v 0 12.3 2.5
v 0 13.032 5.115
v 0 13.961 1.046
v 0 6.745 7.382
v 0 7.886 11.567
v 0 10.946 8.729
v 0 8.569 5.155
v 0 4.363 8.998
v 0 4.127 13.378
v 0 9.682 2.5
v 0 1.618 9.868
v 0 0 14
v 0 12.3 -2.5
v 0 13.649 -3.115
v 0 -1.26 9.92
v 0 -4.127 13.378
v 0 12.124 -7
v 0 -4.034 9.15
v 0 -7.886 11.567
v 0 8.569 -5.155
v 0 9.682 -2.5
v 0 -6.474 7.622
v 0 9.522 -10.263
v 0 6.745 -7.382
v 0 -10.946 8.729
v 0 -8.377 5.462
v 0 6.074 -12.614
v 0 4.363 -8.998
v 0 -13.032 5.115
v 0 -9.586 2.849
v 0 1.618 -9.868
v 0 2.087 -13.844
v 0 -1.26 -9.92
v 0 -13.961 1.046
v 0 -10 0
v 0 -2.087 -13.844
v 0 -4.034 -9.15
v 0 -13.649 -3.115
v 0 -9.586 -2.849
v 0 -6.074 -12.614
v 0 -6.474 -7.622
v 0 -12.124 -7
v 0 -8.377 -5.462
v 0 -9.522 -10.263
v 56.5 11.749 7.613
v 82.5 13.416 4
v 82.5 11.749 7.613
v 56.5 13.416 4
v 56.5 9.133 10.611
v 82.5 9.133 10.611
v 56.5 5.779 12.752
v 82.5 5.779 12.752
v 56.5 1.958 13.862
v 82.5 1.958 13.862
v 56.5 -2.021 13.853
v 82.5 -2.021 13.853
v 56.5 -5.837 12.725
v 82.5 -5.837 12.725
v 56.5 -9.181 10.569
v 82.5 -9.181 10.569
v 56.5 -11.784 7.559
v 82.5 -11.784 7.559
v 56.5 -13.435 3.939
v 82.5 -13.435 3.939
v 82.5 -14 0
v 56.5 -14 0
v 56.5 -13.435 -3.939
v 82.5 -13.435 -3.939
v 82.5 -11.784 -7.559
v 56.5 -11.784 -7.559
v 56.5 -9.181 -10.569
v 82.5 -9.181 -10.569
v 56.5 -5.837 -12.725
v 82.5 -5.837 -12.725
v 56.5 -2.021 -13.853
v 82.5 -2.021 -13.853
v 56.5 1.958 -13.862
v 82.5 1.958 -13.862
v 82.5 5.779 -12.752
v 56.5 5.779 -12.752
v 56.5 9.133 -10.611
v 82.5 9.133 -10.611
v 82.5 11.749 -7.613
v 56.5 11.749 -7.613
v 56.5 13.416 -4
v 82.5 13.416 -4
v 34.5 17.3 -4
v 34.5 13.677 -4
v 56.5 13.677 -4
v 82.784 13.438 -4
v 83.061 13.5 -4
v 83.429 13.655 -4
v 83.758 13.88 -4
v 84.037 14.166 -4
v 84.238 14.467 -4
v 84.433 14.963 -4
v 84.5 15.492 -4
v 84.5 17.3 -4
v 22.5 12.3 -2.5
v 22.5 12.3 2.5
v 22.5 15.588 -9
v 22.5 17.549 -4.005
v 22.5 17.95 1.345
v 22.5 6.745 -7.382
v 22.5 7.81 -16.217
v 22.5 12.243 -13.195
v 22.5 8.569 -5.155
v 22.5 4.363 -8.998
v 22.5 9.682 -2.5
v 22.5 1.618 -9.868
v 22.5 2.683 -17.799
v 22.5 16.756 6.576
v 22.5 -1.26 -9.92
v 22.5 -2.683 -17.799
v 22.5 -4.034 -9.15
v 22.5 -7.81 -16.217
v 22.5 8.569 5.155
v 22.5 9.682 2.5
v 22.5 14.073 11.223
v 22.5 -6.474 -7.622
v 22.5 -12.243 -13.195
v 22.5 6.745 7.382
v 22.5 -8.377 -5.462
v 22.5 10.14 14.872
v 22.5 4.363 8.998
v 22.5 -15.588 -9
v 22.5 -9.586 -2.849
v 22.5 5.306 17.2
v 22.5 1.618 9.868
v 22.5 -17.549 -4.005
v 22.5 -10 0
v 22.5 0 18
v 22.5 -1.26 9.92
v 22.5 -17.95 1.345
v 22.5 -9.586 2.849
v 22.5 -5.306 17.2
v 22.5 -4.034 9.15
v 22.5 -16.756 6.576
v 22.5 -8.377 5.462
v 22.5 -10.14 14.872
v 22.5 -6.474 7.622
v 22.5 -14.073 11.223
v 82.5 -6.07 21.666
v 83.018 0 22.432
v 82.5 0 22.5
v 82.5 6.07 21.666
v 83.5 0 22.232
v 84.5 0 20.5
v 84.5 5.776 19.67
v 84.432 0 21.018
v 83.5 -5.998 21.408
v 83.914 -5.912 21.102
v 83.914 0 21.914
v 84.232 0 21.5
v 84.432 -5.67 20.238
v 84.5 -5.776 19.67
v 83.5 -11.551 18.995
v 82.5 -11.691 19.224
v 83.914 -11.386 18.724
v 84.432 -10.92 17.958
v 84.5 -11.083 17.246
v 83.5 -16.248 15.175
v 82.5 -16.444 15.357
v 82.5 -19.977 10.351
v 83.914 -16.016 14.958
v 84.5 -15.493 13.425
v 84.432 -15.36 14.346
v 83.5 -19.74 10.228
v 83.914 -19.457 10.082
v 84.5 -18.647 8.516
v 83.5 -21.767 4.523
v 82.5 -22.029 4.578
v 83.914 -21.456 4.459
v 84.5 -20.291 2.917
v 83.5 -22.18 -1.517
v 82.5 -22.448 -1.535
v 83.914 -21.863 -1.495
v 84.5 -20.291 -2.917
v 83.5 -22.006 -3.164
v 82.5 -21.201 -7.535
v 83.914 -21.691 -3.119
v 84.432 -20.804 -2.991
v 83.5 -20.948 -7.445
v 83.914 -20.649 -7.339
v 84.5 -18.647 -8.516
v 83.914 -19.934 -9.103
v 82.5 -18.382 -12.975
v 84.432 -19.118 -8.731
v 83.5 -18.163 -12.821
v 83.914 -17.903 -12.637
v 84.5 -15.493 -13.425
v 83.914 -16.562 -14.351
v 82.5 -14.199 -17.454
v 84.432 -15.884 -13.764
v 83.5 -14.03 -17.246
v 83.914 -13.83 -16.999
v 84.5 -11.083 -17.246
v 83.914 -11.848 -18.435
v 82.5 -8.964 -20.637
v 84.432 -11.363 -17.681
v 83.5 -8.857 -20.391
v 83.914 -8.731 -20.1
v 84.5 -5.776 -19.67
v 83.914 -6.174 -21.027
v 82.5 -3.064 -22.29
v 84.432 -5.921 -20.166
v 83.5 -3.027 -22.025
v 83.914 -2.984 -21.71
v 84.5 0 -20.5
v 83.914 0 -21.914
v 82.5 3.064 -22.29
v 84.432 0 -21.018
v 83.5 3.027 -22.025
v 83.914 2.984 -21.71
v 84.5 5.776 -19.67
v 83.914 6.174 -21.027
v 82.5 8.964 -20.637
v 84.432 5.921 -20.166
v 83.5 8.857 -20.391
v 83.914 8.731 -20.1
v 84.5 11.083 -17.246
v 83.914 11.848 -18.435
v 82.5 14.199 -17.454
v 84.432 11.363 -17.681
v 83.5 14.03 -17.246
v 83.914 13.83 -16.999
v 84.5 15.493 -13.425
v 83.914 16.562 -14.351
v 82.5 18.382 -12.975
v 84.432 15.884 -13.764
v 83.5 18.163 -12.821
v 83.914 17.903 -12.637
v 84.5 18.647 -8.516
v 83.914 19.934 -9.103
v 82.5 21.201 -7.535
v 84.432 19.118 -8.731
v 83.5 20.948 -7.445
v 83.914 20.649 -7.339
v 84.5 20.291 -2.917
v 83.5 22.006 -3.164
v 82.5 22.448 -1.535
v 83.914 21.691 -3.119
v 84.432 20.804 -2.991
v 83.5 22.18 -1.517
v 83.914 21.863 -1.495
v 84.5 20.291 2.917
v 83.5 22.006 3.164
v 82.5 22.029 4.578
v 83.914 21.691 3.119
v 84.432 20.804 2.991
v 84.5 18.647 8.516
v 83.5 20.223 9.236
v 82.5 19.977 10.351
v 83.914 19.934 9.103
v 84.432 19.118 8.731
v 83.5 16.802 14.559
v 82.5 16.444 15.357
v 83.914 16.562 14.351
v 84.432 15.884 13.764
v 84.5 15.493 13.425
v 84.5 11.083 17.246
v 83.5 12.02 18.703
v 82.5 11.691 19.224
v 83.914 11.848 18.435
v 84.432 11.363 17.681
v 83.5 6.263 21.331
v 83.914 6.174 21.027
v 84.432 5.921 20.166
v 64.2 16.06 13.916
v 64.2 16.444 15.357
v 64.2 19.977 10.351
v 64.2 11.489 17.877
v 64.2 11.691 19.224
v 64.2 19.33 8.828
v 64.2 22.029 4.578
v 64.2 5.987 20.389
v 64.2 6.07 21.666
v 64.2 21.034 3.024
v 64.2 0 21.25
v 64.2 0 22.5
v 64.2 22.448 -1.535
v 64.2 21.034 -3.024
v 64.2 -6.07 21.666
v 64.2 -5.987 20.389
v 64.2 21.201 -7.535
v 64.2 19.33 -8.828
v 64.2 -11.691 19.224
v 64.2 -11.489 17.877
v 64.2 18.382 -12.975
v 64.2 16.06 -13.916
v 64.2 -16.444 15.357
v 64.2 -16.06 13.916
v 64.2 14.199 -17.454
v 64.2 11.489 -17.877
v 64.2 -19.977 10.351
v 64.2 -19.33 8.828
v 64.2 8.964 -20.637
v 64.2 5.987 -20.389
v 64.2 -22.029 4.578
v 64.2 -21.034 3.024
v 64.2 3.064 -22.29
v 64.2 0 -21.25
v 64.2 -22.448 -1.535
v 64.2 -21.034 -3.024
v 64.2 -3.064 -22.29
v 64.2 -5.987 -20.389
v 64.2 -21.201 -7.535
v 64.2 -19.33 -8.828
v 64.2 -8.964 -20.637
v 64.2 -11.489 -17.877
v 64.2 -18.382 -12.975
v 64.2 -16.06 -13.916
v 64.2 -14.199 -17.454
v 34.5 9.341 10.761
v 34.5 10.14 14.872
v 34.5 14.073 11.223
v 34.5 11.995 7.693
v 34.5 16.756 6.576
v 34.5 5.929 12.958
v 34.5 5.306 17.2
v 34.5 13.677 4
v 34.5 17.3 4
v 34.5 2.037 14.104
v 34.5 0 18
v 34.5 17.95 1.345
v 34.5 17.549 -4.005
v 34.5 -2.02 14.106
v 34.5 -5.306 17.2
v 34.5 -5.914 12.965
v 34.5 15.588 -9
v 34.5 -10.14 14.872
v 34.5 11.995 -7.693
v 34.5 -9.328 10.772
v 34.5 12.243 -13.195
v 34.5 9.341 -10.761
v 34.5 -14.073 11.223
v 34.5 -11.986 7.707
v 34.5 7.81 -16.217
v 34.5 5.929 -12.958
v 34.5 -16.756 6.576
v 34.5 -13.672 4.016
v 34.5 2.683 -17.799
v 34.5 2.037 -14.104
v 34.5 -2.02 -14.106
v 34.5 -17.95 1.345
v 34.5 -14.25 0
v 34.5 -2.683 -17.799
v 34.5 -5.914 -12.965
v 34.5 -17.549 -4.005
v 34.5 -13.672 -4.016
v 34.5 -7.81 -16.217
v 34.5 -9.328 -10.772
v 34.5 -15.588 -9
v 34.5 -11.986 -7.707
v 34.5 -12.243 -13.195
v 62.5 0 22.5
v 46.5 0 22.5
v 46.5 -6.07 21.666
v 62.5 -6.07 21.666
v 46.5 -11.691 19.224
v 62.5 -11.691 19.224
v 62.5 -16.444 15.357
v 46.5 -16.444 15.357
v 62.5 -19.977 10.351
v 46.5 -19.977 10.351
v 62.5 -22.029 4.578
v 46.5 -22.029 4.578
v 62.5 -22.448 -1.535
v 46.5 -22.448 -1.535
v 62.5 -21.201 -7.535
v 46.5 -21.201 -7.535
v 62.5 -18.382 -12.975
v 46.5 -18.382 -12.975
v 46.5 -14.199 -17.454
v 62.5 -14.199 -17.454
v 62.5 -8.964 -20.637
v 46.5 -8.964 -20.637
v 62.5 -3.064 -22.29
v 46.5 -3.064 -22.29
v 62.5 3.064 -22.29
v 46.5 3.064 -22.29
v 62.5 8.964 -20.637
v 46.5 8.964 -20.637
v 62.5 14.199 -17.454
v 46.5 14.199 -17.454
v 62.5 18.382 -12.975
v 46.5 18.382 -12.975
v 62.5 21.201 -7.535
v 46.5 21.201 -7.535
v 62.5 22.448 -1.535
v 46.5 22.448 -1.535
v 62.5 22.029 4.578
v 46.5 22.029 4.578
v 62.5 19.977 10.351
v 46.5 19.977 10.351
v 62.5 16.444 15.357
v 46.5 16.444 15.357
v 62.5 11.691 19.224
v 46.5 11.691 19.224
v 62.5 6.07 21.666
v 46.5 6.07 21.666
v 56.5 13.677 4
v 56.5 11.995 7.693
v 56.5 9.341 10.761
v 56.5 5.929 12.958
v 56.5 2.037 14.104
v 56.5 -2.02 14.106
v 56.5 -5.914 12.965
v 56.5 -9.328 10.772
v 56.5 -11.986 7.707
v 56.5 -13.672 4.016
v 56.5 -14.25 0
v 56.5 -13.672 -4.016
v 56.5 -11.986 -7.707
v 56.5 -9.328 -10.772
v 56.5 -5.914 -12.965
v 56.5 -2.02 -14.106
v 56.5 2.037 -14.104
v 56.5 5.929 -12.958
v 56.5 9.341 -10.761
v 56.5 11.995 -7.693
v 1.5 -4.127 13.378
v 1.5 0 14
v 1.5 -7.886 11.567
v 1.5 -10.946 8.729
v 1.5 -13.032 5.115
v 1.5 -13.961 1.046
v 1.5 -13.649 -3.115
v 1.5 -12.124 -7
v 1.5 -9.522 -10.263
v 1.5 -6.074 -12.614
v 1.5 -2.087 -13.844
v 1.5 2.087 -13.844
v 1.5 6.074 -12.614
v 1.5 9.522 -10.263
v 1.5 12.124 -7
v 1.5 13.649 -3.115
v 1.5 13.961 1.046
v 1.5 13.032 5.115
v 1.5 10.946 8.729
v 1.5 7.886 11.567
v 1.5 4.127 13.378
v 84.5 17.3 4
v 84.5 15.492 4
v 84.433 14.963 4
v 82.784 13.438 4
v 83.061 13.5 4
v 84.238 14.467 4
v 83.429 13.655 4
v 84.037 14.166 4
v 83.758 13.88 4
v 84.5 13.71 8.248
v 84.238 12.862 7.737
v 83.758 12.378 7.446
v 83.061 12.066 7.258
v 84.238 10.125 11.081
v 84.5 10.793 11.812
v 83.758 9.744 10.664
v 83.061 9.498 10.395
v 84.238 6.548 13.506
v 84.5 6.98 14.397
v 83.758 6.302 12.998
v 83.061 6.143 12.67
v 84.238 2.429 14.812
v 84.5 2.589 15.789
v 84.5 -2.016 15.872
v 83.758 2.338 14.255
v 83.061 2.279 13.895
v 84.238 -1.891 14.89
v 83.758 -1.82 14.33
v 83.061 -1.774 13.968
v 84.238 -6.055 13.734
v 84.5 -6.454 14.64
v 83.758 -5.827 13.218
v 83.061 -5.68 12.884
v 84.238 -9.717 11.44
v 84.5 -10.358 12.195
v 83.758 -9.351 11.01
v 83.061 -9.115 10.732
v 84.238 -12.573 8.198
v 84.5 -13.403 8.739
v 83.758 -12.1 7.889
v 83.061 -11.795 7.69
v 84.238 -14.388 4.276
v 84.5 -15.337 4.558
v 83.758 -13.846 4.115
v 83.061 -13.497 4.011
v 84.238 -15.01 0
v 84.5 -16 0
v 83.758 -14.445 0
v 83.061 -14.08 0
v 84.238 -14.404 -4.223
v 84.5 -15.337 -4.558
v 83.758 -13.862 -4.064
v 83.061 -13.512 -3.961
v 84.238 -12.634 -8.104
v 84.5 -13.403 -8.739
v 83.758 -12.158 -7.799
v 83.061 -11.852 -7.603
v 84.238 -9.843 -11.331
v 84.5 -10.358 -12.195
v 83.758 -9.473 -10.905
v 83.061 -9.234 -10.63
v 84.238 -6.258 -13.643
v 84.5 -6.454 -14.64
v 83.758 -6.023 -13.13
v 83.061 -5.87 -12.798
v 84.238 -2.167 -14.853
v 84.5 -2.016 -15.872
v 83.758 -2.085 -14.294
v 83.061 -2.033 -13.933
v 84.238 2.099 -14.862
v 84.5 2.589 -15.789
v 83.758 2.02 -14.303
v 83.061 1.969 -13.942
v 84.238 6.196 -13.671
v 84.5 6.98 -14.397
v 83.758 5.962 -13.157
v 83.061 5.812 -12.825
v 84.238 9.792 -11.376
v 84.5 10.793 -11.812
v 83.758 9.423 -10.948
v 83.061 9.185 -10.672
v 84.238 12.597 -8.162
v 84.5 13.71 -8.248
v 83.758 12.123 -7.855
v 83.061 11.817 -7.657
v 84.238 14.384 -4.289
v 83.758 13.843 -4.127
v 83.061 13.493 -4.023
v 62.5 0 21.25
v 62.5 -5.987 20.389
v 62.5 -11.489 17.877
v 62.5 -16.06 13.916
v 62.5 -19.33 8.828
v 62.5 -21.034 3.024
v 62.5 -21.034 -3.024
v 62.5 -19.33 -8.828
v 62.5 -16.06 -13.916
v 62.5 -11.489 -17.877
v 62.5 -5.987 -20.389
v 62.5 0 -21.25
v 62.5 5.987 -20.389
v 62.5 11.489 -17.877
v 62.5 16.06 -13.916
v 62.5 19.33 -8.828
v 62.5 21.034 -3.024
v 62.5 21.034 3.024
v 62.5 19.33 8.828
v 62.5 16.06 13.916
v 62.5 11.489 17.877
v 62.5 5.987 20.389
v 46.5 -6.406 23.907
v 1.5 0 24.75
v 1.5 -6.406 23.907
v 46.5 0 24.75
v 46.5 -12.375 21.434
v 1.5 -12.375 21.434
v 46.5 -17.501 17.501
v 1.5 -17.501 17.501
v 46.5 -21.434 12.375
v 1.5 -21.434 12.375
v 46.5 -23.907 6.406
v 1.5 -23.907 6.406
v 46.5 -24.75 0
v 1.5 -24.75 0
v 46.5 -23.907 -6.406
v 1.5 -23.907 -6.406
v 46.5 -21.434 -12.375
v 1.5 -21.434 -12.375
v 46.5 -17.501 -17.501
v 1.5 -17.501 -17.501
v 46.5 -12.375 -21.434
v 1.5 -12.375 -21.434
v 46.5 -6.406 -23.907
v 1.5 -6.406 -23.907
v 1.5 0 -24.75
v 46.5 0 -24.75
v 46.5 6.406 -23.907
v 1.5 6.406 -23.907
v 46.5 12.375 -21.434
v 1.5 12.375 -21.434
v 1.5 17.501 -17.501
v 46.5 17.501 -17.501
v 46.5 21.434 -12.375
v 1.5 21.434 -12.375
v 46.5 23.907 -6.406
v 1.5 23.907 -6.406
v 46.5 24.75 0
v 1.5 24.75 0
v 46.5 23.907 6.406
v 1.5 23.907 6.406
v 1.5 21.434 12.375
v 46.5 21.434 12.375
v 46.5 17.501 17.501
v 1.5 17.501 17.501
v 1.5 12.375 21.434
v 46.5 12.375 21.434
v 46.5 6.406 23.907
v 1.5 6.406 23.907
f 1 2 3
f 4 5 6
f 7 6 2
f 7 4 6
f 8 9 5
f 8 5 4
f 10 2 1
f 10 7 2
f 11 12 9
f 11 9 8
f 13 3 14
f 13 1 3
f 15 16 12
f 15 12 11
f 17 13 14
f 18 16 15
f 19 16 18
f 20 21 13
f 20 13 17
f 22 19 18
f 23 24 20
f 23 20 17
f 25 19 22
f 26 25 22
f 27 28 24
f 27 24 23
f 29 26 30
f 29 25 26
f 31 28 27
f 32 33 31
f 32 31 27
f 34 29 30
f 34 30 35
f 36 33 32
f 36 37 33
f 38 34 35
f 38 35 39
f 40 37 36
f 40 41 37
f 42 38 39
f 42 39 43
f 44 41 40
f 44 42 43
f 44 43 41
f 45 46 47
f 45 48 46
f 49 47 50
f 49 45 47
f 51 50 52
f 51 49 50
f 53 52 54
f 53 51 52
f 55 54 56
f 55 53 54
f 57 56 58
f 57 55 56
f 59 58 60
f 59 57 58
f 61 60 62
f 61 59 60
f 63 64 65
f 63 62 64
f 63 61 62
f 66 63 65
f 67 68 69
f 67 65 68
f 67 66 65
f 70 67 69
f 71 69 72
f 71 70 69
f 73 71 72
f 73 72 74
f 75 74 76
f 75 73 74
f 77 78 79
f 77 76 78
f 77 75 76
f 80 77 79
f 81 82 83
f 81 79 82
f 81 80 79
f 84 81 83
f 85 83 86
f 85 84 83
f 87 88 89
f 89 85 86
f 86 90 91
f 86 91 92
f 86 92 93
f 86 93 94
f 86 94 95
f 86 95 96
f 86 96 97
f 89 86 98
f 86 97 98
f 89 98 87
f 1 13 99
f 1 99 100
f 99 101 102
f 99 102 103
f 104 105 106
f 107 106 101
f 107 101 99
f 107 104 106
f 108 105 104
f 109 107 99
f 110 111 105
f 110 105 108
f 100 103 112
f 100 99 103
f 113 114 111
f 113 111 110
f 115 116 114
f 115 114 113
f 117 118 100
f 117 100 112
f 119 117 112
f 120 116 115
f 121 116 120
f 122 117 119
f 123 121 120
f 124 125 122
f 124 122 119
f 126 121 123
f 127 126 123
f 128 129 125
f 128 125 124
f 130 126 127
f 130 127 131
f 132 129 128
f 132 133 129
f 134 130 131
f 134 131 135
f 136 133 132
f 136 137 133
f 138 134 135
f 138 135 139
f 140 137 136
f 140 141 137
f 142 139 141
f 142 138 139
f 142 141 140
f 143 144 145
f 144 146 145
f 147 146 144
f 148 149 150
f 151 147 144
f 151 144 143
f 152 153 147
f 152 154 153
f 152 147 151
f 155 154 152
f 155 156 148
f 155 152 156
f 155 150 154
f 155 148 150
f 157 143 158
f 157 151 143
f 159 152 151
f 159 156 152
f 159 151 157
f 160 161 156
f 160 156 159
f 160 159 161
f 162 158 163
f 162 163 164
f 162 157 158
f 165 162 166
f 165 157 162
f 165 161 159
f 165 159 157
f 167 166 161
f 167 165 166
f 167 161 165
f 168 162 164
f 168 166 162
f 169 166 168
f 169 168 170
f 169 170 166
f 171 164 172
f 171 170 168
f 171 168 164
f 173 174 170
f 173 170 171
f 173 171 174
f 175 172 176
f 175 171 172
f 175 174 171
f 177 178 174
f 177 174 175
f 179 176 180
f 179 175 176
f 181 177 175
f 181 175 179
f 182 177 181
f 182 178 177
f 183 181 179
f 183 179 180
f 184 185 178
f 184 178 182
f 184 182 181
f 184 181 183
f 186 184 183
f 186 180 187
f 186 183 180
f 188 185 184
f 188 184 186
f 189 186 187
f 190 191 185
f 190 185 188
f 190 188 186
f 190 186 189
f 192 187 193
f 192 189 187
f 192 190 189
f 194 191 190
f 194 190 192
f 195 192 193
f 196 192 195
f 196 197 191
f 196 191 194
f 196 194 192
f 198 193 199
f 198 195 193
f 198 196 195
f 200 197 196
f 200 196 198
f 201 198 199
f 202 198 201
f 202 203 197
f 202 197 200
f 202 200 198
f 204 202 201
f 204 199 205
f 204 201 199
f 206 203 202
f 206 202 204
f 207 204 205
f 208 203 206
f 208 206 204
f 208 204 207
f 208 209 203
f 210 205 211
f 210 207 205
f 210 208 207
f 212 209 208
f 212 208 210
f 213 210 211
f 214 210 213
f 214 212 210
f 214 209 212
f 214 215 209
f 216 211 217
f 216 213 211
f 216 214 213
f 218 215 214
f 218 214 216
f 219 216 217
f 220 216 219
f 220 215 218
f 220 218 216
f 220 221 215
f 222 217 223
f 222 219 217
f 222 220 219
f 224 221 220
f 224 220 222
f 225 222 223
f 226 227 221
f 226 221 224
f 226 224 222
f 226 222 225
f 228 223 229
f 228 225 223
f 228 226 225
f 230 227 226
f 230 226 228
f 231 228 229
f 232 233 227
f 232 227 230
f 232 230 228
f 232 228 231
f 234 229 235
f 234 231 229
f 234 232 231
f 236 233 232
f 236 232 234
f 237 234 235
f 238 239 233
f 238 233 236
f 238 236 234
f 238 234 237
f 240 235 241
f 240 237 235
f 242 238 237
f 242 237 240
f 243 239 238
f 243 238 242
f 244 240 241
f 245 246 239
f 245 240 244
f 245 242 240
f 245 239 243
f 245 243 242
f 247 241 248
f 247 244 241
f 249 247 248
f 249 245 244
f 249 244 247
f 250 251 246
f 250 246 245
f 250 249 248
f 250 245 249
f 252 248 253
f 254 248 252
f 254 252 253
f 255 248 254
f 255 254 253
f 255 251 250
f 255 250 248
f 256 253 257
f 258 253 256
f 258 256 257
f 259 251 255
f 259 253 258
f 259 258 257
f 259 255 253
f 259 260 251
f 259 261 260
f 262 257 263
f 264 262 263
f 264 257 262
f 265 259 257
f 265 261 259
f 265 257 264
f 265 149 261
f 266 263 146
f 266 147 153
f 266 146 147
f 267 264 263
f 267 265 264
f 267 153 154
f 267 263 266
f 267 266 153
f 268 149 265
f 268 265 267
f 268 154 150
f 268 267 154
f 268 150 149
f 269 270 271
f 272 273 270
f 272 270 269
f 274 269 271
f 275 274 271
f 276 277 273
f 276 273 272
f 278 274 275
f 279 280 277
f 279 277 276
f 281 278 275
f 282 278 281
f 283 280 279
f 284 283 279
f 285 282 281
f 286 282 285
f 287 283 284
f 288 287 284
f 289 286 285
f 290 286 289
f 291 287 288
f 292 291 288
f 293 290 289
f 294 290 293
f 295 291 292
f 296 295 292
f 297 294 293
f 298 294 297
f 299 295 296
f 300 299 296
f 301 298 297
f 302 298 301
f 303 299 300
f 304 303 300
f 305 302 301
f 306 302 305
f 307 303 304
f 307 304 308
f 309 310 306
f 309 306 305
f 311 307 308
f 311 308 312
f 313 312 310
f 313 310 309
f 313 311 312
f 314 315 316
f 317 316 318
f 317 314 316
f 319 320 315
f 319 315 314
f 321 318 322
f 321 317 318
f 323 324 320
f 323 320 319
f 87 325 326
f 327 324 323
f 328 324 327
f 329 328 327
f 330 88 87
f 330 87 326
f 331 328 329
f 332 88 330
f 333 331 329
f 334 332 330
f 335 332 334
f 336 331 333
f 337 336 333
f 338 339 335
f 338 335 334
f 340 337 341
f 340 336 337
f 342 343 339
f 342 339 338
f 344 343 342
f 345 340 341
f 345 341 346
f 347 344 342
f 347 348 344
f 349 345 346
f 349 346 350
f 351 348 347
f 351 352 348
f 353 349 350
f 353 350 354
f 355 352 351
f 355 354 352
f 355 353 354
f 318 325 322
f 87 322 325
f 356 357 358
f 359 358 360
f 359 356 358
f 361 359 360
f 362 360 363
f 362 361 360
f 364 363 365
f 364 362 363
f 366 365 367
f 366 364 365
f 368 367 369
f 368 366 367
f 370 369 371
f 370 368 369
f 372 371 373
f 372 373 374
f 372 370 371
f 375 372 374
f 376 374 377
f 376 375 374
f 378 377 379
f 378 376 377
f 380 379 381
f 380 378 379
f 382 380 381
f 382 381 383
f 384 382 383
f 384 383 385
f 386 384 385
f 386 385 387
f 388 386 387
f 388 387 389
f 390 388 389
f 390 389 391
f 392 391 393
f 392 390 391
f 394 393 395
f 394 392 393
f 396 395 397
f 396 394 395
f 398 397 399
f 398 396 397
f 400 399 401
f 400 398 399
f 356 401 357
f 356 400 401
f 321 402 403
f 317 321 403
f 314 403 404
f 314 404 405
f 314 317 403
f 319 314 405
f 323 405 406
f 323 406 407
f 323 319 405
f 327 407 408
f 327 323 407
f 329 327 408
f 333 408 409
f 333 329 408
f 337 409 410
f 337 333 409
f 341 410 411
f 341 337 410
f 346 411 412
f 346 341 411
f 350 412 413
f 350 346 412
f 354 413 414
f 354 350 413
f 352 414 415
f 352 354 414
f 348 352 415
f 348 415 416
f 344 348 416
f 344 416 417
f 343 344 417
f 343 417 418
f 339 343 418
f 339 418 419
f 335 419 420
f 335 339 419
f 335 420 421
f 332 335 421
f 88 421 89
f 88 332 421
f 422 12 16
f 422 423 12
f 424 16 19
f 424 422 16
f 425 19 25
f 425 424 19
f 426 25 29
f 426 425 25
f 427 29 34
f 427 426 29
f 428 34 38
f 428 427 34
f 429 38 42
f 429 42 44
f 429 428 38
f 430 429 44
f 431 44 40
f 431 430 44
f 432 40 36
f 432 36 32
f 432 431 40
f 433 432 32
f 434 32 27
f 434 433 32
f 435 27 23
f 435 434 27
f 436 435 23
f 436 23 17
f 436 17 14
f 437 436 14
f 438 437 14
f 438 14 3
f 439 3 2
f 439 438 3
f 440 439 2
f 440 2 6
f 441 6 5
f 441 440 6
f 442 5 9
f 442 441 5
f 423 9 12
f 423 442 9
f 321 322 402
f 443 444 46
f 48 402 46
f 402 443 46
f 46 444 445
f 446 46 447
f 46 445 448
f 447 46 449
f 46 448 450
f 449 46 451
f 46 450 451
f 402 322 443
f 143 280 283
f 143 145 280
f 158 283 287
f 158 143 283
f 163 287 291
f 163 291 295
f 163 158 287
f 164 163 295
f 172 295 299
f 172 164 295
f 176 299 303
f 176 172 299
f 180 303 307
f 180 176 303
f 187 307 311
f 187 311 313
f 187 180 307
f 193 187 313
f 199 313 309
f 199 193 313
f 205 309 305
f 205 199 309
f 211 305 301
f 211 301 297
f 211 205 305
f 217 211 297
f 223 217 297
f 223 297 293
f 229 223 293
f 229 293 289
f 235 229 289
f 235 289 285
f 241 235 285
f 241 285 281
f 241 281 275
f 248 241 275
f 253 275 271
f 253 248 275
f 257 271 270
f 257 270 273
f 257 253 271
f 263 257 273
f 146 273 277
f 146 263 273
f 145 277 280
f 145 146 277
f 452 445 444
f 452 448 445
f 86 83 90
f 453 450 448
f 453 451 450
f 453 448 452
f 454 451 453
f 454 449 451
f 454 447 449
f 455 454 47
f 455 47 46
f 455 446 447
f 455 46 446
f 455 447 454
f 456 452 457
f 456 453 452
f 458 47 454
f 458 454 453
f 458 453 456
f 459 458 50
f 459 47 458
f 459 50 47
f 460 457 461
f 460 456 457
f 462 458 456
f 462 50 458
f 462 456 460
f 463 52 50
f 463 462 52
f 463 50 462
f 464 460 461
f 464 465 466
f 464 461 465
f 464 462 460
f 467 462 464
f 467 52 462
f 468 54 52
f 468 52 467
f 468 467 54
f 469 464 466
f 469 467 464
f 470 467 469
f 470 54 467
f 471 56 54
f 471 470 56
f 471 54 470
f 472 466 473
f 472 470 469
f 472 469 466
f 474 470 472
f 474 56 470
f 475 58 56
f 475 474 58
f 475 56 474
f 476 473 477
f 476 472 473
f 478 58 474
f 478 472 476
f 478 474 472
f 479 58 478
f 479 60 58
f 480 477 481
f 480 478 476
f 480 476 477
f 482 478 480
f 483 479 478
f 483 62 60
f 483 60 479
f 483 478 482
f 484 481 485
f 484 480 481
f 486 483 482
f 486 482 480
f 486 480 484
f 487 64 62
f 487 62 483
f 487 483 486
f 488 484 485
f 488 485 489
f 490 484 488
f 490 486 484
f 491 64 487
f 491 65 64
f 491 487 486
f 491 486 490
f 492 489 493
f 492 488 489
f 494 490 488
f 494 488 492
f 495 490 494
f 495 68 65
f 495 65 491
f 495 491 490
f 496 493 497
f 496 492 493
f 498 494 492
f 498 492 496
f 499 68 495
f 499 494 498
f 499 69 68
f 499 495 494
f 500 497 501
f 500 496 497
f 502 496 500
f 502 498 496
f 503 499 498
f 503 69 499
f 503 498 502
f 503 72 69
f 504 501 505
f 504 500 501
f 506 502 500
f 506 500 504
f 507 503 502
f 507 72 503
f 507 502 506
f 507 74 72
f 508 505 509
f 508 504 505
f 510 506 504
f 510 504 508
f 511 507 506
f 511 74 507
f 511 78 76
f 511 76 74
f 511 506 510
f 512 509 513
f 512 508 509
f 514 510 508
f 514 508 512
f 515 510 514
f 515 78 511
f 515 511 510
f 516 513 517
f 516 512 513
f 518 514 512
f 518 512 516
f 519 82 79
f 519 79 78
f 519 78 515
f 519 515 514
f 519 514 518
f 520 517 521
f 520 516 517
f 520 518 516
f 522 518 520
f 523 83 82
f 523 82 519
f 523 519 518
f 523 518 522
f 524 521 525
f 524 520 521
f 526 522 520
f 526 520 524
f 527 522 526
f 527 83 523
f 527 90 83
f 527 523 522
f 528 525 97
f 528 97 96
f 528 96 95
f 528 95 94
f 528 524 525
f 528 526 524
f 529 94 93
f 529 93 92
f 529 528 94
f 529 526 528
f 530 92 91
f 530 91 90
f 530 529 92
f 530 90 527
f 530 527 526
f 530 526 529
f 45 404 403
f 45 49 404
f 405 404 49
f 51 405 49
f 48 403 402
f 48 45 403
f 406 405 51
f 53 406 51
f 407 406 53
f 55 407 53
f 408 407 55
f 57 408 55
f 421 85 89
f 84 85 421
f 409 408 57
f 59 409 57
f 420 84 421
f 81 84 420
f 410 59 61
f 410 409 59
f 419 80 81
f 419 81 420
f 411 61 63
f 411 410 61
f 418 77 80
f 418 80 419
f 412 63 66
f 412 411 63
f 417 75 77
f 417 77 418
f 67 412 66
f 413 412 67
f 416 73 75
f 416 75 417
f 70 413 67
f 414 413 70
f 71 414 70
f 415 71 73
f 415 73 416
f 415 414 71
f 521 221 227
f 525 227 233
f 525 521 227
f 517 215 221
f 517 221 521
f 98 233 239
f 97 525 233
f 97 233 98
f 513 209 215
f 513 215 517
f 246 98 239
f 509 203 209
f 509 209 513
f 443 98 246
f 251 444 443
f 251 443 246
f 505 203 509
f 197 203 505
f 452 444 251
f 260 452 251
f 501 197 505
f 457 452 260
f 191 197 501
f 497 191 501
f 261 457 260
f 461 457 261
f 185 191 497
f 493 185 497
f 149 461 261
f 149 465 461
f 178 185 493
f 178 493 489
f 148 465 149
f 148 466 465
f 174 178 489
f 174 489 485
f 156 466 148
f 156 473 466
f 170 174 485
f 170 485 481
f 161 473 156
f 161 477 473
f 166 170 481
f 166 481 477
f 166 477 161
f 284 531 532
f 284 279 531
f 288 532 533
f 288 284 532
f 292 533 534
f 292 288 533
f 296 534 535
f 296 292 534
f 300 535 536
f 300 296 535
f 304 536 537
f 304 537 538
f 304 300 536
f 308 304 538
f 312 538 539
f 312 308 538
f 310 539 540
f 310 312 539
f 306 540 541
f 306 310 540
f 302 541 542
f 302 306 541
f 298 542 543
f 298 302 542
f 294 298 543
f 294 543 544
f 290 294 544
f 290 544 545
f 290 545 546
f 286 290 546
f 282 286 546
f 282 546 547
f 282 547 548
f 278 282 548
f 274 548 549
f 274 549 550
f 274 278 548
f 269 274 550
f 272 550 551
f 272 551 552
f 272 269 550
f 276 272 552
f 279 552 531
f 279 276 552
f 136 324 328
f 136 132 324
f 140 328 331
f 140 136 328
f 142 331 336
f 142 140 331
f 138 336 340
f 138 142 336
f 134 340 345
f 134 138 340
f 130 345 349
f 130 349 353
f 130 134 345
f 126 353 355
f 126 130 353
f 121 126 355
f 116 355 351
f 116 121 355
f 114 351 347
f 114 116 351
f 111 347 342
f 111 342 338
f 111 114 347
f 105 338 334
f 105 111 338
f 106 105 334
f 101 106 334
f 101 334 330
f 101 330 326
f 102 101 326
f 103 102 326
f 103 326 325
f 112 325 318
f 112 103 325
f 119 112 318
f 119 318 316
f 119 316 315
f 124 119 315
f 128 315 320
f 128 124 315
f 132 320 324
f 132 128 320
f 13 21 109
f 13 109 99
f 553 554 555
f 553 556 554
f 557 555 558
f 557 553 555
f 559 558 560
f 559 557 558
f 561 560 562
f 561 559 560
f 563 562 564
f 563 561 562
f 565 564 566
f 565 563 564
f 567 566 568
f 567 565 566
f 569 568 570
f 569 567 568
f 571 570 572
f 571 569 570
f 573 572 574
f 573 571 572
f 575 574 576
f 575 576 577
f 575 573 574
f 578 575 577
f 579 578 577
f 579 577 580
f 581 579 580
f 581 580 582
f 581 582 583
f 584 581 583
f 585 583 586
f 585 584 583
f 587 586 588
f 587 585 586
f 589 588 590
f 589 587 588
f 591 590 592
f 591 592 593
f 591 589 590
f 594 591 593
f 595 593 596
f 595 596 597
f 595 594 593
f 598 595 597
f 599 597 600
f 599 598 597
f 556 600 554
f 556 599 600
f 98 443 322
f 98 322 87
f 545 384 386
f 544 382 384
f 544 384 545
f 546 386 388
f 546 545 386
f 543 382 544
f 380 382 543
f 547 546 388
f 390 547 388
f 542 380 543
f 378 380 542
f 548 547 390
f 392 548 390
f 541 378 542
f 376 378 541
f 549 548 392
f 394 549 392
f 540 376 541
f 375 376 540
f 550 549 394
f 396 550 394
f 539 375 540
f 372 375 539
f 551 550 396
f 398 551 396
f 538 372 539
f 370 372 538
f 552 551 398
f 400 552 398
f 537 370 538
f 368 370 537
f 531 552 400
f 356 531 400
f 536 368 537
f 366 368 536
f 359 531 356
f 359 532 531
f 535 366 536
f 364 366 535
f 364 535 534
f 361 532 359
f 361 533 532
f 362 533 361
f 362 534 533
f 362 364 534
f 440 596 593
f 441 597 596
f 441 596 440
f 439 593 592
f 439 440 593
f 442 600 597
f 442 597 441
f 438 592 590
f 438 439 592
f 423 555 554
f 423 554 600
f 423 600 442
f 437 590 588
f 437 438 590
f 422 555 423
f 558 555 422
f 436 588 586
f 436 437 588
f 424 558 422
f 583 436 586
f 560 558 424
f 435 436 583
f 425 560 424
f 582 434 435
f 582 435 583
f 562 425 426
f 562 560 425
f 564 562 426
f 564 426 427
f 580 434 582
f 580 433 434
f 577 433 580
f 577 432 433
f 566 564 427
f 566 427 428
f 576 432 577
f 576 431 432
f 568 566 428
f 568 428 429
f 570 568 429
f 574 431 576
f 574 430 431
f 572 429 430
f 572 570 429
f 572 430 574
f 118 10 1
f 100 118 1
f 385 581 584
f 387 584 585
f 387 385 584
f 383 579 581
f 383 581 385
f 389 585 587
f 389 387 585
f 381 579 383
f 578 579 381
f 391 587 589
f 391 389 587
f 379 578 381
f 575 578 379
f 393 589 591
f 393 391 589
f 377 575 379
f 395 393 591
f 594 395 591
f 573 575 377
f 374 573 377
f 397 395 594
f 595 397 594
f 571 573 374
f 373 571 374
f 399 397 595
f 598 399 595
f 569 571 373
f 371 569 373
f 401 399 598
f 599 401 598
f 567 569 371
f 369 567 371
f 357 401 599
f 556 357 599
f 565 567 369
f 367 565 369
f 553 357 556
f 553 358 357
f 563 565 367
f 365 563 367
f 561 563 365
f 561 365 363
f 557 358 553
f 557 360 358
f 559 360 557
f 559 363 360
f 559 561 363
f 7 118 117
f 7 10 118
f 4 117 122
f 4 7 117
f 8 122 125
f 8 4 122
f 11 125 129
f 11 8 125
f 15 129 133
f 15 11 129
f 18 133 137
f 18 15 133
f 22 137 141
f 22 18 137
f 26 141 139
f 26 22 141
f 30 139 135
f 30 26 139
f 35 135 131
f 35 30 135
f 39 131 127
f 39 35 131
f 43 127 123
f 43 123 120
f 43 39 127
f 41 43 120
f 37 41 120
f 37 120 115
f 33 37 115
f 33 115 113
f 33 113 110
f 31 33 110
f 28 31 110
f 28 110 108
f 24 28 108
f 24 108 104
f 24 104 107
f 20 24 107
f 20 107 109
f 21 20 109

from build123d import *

# Parameters (mm, degrees)
CUT_EXTRUDE_1_REACH = 93.462
SKETCH_2_W          = 5
SKETCH_2_H          = 4.6
CUT_EXTRUDE_2_REACH = 93.462


with BuildPart() as part:
    # 草图1 → 旋转1 (revolve)
    with BuildSketch(Plane(origin=(0, 0, 0), x_dir=(1, 0, 0), z_dir=(0, 1, 0)), mode=Mode.PRIVATE) as revolve_1_sk:
        with BuildLine():
            Line((0, 10), (0, 14))
            Line((0, 14), (1.5, 14))
            Line((1.5, 14), (1.5, 24.75))
            Line((1.5, 24.75), (46.5, 24.75))
            Line((46.5, 24.75), (46.5, 22.5))
            Line((46.5, 22.5), (62.5, 22.5))
            Line((62.5, 22.5), (62.5, 21.25))
            Line((62.5, 21.25), (64.2, 21.25))
            Line((64.2, 21.25), (64.2, 22.5))
            Line((64.2, 22.5), (82.5, 22.5))
            ThreePointArc((82.5, 22.5), (83.914213562, 21.914213562), (84.5, 20.5))
            Line((84.5, 20.5), (84.5, 16))
            ThreePointArc((84.5, 16), (83.914213562, 14.585786438), (82.5, 14))
            Line((82.5, 14), (56.5, 14))
            Line((56.5, 14), (56.5, 14.25))
            Line((56.5, 14.25), (34.5, 14.25))
            Line((34.5, 14.25), (34.5, 18))
            Line((34.5, 18), (22.5, 18))
            Line((22.5, 18), (22.5, 10))
            Line((22.5, 10), (0, 10))
        make_face()
    revolve(revolve_1_sk.sketch.rotate(Axis((-32.624113475, 0, 0), (1, 0, 0)), 180), axis=Axis((-32.624113475, 0, 0), (1, 0, 0)))

    # 草图2 → 切除-拉伸1 (cut, up to next)
    with BuildSketch(Plane.ZY, mode=Mode.PRIVATE) as cut_extrude_1_sk1:
        with Locations((0, 10)):
            Rectangle(SKETCH_2_W, SKETCH_2_H)
    cut_extrude_1_tool1 = extrude(cut_extrude_1_sk1.sketch, amount=-CUT_EXTRUDE_1_REACH, mode=Mode.PRIVATE) & part.part
    add(cut_extrude_1_tool1.solids().sort_by_distance((0, 10, 0))[0], mode=Mode.SUBTRACT)

    # 草图3 → 切除-拉伸2 (cut, up to next)
    with BuildSketch(Plane(origin=(84.5, 0, 0), x_dir=(0, 0, -1), z_dir=(1, 0, 0)), mode=Mode.PRIVATE) as cut_extrude_2_sk1:
        Polygon((4, 14.7), (4, 10.868150386), (-4, 10.868150386), (-4, 14.7), (-4, 17.3), (4, 17.3), align=None)
    cut_extrude_2_tool1 = extrude(cut_extrude_2_sk1.sketch, amount=-CUT_EXTRUDE_2_REACH, mode=Mode.PRIVATE) & part.part
    add(cut_extrude_2_tool1.solids().sort_by_distance((84.5, 14.084075, 0))[0], mode=Mode.SUBTRACT)


solid = part.part
